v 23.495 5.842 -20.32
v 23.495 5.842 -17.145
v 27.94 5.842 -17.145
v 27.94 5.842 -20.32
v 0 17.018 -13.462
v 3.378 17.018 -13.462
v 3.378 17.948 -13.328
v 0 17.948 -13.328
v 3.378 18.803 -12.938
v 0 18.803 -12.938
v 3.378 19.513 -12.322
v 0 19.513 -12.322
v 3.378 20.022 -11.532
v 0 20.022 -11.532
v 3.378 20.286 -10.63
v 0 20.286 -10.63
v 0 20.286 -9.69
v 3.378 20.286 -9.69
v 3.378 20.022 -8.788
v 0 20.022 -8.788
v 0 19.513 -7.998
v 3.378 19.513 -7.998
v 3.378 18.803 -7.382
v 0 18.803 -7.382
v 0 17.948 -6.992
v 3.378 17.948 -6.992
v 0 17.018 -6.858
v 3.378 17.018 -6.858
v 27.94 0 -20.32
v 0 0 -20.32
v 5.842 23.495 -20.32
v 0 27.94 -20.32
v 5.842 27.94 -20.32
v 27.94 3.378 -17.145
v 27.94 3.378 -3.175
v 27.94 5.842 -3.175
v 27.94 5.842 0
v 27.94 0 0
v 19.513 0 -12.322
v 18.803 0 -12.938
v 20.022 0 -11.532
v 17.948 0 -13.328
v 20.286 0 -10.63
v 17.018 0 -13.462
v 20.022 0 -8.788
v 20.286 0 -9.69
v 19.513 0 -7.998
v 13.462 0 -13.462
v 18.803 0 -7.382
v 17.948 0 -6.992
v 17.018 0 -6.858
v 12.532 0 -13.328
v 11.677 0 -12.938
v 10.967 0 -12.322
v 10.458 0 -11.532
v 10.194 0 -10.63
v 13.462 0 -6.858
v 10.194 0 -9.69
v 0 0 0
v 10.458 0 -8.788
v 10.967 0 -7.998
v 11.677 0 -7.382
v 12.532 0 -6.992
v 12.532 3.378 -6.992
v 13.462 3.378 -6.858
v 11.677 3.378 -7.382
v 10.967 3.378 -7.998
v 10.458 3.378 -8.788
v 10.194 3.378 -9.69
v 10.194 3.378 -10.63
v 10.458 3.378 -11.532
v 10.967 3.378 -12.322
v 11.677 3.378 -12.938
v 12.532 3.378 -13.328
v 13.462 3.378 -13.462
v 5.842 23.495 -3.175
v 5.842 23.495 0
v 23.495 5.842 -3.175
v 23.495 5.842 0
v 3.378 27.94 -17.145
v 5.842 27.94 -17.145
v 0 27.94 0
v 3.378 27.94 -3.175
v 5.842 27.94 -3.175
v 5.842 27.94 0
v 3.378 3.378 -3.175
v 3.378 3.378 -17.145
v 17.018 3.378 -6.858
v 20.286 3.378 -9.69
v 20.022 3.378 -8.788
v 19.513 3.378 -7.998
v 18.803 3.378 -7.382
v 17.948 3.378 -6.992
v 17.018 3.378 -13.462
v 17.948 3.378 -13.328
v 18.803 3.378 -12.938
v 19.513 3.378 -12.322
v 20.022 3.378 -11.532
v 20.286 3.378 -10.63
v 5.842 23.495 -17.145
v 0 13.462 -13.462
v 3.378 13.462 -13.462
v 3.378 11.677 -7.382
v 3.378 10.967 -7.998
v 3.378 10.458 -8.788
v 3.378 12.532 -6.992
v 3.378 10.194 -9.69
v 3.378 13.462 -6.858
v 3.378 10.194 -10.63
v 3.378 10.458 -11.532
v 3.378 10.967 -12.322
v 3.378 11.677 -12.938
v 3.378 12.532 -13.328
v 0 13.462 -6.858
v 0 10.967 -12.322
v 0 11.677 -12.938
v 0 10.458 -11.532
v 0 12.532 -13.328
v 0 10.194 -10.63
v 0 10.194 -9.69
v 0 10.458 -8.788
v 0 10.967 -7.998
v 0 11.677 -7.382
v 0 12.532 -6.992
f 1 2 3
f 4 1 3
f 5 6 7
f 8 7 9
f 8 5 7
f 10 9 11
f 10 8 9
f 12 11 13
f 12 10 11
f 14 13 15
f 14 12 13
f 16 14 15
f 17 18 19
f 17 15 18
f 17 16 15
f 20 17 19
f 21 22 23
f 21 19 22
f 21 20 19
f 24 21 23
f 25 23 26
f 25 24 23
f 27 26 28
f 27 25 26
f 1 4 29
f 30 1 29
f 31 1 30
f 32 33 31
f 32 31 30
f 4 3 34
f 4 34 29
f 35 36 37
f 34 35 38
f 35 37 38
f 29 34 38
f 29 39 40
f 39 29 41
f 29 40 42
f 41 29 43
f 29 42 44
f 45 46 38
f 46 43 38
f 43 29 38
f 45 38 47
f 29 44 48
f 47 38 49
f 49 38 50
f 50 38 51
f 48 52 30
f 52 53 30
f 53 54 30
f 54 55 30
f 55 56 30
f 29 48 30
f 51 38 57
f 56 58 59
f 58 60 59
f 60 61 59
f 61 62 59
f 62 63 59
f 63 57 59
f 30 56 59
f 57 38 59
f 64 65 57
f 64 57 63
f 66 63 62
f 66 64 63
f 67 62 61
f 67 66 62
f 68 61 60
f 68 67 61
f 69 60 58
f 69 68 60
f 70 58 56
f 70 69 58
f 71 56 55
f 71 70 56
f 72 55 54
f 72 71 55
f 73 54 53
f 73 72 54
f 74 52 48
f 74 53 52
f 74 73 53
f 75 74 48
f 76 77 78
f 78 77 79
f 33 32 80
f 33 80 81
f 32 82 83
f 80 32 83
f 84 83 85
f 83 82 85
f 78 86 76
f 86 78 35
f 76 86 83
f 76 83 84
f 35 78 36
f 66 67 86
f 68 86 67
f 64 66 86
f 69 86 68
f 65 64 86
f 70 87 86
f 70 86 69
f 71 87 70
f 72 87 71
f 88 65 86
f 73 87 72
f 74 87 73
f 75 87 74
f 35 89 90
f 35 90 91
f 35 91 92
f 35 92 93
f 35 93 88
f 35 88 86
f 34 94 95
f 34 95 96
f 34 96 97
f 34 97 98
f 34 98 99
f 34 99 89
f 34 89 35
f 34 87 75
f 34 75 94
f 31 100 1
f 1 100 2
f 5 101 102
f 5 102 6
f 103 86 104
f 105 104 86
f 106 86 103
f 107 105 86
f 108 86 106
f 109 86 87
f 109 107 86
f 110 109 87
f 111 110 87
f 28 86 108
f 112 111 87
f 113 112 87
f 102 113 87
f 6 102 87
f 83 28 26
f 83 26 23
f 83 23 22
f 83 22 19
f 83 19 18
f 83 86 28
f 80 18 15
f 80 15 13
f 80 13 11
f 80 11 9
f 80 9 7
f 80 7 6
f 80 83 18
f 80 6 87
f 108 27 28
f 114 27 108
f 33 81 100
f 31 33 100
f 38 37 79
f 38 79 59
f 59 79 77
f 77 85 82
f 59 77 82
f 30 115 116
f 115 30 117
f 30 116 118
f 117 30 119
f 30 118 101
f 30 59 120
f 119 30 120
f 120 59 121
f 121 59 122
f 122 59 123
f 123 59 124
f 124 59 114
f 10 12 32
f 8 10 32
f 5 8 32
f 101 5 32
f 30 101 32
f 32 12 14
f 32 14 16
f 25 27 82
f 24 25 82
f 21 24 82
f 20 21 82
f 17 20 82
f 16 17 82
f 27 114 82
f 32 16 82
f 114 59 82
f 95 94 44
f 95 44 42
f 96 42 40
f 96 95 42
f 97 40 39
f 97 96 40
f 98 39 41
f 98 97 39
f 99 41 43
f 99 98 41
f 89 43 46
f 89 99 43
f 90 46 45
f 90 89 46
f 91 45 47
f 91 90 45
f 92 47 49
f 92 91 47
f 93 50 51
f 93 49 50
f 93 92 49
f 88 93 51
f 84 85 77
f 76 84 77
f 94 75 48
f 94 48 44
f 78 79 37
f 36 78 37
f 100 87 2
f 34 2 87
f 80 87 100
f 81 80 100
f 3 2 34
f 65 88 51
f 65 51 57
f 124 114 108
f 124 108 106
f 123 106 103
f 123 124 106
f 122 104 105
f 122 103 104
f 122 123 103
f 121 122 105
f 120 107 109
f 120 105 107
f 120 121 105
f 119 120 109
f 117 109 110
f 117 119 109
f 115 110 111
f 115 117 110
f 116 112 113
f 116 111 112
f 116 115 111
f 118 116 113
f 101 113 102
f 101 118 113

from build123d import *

# Parameters (mm, degrees)
BOSS_EXTRUDE1_DEPTH = 20.32
SKETCH2_W           = 24.5618
SKETCH2_H           = 13.97
CUT_EXTRUDE1_DEPTH  = 24.5618
CUT_EXTRUDE2_DEPTH  = 43.389008236
CIRPATTERN1_COUNT   = 2
CIRPATTERN1_ANGLE   = 270


with BuildPart() as part:
    # Sketch1 → Boss-Extrude1 (new body)
    with BuildSketch(Plane.XY):
        Polygon((0, 0), (0, 27.94), (5.842, 27.94), (5.842, 23.495), (23.495, 5.842), (27.94, 5.842), (27.94, 0), align=None)
    extrude(amount=-BOSS_EXTRUDE1_DEPTH)

    # Sketch2 → Cut-Extrude1 (cut)
    with BuildSketch(Plane(origin=(0, 27.94, 0), x_dir=(1, 0, 0), z_dir=(0, 1, 0))):
        with Locations((15.6591, 10.16)):
            Rectangle(SKETCH2_W, SKETCH2_H)
    extrude(amount=-CUT_EXTRUDE1_DEPTH, mode=Mode.SUBTRACT)

    # Sketch3 → Cut-Extrude2 (cut, through all)
    with BuildSketch(Plane(origin=(0, 3.3782, 0), x_dir=(1, 0, 0), z_dir=(0, 1, 0))):
        with BuildLine():
            Line((13.462, 13.462), (17.018, 13.462))
            ThreePointArc((17.018, 13.462), (20.32, 10.16), (17.018, 6.858))
            Line((17.018, 6.858), (13.462, 6.858))
            ThreePointArc((13.462, 6.858), (10.16, 10.16), (13.462, 13.462))
        make_face()
    cut_extrude2 = extrude(amount=-CUT_EXTRUDE2_DEPTH, mode=Mode.SUBTRACT)

    # CirPattern1: Cut-Extrude2 ×2 about axis
    cirpattern1_axis = Axis((0, 0, -20.32), (0, 0, -1))
    for i in range(1, CIRPATTERN1_COUNT):
        add(cut_extrude2.rotate(cirpattern1_axis, i * CIRPATTERN1_ANGLE / (CIRPATTERN1_COUNT - 1)), mode=Mode.SUBTRACT)


solid = part.part
